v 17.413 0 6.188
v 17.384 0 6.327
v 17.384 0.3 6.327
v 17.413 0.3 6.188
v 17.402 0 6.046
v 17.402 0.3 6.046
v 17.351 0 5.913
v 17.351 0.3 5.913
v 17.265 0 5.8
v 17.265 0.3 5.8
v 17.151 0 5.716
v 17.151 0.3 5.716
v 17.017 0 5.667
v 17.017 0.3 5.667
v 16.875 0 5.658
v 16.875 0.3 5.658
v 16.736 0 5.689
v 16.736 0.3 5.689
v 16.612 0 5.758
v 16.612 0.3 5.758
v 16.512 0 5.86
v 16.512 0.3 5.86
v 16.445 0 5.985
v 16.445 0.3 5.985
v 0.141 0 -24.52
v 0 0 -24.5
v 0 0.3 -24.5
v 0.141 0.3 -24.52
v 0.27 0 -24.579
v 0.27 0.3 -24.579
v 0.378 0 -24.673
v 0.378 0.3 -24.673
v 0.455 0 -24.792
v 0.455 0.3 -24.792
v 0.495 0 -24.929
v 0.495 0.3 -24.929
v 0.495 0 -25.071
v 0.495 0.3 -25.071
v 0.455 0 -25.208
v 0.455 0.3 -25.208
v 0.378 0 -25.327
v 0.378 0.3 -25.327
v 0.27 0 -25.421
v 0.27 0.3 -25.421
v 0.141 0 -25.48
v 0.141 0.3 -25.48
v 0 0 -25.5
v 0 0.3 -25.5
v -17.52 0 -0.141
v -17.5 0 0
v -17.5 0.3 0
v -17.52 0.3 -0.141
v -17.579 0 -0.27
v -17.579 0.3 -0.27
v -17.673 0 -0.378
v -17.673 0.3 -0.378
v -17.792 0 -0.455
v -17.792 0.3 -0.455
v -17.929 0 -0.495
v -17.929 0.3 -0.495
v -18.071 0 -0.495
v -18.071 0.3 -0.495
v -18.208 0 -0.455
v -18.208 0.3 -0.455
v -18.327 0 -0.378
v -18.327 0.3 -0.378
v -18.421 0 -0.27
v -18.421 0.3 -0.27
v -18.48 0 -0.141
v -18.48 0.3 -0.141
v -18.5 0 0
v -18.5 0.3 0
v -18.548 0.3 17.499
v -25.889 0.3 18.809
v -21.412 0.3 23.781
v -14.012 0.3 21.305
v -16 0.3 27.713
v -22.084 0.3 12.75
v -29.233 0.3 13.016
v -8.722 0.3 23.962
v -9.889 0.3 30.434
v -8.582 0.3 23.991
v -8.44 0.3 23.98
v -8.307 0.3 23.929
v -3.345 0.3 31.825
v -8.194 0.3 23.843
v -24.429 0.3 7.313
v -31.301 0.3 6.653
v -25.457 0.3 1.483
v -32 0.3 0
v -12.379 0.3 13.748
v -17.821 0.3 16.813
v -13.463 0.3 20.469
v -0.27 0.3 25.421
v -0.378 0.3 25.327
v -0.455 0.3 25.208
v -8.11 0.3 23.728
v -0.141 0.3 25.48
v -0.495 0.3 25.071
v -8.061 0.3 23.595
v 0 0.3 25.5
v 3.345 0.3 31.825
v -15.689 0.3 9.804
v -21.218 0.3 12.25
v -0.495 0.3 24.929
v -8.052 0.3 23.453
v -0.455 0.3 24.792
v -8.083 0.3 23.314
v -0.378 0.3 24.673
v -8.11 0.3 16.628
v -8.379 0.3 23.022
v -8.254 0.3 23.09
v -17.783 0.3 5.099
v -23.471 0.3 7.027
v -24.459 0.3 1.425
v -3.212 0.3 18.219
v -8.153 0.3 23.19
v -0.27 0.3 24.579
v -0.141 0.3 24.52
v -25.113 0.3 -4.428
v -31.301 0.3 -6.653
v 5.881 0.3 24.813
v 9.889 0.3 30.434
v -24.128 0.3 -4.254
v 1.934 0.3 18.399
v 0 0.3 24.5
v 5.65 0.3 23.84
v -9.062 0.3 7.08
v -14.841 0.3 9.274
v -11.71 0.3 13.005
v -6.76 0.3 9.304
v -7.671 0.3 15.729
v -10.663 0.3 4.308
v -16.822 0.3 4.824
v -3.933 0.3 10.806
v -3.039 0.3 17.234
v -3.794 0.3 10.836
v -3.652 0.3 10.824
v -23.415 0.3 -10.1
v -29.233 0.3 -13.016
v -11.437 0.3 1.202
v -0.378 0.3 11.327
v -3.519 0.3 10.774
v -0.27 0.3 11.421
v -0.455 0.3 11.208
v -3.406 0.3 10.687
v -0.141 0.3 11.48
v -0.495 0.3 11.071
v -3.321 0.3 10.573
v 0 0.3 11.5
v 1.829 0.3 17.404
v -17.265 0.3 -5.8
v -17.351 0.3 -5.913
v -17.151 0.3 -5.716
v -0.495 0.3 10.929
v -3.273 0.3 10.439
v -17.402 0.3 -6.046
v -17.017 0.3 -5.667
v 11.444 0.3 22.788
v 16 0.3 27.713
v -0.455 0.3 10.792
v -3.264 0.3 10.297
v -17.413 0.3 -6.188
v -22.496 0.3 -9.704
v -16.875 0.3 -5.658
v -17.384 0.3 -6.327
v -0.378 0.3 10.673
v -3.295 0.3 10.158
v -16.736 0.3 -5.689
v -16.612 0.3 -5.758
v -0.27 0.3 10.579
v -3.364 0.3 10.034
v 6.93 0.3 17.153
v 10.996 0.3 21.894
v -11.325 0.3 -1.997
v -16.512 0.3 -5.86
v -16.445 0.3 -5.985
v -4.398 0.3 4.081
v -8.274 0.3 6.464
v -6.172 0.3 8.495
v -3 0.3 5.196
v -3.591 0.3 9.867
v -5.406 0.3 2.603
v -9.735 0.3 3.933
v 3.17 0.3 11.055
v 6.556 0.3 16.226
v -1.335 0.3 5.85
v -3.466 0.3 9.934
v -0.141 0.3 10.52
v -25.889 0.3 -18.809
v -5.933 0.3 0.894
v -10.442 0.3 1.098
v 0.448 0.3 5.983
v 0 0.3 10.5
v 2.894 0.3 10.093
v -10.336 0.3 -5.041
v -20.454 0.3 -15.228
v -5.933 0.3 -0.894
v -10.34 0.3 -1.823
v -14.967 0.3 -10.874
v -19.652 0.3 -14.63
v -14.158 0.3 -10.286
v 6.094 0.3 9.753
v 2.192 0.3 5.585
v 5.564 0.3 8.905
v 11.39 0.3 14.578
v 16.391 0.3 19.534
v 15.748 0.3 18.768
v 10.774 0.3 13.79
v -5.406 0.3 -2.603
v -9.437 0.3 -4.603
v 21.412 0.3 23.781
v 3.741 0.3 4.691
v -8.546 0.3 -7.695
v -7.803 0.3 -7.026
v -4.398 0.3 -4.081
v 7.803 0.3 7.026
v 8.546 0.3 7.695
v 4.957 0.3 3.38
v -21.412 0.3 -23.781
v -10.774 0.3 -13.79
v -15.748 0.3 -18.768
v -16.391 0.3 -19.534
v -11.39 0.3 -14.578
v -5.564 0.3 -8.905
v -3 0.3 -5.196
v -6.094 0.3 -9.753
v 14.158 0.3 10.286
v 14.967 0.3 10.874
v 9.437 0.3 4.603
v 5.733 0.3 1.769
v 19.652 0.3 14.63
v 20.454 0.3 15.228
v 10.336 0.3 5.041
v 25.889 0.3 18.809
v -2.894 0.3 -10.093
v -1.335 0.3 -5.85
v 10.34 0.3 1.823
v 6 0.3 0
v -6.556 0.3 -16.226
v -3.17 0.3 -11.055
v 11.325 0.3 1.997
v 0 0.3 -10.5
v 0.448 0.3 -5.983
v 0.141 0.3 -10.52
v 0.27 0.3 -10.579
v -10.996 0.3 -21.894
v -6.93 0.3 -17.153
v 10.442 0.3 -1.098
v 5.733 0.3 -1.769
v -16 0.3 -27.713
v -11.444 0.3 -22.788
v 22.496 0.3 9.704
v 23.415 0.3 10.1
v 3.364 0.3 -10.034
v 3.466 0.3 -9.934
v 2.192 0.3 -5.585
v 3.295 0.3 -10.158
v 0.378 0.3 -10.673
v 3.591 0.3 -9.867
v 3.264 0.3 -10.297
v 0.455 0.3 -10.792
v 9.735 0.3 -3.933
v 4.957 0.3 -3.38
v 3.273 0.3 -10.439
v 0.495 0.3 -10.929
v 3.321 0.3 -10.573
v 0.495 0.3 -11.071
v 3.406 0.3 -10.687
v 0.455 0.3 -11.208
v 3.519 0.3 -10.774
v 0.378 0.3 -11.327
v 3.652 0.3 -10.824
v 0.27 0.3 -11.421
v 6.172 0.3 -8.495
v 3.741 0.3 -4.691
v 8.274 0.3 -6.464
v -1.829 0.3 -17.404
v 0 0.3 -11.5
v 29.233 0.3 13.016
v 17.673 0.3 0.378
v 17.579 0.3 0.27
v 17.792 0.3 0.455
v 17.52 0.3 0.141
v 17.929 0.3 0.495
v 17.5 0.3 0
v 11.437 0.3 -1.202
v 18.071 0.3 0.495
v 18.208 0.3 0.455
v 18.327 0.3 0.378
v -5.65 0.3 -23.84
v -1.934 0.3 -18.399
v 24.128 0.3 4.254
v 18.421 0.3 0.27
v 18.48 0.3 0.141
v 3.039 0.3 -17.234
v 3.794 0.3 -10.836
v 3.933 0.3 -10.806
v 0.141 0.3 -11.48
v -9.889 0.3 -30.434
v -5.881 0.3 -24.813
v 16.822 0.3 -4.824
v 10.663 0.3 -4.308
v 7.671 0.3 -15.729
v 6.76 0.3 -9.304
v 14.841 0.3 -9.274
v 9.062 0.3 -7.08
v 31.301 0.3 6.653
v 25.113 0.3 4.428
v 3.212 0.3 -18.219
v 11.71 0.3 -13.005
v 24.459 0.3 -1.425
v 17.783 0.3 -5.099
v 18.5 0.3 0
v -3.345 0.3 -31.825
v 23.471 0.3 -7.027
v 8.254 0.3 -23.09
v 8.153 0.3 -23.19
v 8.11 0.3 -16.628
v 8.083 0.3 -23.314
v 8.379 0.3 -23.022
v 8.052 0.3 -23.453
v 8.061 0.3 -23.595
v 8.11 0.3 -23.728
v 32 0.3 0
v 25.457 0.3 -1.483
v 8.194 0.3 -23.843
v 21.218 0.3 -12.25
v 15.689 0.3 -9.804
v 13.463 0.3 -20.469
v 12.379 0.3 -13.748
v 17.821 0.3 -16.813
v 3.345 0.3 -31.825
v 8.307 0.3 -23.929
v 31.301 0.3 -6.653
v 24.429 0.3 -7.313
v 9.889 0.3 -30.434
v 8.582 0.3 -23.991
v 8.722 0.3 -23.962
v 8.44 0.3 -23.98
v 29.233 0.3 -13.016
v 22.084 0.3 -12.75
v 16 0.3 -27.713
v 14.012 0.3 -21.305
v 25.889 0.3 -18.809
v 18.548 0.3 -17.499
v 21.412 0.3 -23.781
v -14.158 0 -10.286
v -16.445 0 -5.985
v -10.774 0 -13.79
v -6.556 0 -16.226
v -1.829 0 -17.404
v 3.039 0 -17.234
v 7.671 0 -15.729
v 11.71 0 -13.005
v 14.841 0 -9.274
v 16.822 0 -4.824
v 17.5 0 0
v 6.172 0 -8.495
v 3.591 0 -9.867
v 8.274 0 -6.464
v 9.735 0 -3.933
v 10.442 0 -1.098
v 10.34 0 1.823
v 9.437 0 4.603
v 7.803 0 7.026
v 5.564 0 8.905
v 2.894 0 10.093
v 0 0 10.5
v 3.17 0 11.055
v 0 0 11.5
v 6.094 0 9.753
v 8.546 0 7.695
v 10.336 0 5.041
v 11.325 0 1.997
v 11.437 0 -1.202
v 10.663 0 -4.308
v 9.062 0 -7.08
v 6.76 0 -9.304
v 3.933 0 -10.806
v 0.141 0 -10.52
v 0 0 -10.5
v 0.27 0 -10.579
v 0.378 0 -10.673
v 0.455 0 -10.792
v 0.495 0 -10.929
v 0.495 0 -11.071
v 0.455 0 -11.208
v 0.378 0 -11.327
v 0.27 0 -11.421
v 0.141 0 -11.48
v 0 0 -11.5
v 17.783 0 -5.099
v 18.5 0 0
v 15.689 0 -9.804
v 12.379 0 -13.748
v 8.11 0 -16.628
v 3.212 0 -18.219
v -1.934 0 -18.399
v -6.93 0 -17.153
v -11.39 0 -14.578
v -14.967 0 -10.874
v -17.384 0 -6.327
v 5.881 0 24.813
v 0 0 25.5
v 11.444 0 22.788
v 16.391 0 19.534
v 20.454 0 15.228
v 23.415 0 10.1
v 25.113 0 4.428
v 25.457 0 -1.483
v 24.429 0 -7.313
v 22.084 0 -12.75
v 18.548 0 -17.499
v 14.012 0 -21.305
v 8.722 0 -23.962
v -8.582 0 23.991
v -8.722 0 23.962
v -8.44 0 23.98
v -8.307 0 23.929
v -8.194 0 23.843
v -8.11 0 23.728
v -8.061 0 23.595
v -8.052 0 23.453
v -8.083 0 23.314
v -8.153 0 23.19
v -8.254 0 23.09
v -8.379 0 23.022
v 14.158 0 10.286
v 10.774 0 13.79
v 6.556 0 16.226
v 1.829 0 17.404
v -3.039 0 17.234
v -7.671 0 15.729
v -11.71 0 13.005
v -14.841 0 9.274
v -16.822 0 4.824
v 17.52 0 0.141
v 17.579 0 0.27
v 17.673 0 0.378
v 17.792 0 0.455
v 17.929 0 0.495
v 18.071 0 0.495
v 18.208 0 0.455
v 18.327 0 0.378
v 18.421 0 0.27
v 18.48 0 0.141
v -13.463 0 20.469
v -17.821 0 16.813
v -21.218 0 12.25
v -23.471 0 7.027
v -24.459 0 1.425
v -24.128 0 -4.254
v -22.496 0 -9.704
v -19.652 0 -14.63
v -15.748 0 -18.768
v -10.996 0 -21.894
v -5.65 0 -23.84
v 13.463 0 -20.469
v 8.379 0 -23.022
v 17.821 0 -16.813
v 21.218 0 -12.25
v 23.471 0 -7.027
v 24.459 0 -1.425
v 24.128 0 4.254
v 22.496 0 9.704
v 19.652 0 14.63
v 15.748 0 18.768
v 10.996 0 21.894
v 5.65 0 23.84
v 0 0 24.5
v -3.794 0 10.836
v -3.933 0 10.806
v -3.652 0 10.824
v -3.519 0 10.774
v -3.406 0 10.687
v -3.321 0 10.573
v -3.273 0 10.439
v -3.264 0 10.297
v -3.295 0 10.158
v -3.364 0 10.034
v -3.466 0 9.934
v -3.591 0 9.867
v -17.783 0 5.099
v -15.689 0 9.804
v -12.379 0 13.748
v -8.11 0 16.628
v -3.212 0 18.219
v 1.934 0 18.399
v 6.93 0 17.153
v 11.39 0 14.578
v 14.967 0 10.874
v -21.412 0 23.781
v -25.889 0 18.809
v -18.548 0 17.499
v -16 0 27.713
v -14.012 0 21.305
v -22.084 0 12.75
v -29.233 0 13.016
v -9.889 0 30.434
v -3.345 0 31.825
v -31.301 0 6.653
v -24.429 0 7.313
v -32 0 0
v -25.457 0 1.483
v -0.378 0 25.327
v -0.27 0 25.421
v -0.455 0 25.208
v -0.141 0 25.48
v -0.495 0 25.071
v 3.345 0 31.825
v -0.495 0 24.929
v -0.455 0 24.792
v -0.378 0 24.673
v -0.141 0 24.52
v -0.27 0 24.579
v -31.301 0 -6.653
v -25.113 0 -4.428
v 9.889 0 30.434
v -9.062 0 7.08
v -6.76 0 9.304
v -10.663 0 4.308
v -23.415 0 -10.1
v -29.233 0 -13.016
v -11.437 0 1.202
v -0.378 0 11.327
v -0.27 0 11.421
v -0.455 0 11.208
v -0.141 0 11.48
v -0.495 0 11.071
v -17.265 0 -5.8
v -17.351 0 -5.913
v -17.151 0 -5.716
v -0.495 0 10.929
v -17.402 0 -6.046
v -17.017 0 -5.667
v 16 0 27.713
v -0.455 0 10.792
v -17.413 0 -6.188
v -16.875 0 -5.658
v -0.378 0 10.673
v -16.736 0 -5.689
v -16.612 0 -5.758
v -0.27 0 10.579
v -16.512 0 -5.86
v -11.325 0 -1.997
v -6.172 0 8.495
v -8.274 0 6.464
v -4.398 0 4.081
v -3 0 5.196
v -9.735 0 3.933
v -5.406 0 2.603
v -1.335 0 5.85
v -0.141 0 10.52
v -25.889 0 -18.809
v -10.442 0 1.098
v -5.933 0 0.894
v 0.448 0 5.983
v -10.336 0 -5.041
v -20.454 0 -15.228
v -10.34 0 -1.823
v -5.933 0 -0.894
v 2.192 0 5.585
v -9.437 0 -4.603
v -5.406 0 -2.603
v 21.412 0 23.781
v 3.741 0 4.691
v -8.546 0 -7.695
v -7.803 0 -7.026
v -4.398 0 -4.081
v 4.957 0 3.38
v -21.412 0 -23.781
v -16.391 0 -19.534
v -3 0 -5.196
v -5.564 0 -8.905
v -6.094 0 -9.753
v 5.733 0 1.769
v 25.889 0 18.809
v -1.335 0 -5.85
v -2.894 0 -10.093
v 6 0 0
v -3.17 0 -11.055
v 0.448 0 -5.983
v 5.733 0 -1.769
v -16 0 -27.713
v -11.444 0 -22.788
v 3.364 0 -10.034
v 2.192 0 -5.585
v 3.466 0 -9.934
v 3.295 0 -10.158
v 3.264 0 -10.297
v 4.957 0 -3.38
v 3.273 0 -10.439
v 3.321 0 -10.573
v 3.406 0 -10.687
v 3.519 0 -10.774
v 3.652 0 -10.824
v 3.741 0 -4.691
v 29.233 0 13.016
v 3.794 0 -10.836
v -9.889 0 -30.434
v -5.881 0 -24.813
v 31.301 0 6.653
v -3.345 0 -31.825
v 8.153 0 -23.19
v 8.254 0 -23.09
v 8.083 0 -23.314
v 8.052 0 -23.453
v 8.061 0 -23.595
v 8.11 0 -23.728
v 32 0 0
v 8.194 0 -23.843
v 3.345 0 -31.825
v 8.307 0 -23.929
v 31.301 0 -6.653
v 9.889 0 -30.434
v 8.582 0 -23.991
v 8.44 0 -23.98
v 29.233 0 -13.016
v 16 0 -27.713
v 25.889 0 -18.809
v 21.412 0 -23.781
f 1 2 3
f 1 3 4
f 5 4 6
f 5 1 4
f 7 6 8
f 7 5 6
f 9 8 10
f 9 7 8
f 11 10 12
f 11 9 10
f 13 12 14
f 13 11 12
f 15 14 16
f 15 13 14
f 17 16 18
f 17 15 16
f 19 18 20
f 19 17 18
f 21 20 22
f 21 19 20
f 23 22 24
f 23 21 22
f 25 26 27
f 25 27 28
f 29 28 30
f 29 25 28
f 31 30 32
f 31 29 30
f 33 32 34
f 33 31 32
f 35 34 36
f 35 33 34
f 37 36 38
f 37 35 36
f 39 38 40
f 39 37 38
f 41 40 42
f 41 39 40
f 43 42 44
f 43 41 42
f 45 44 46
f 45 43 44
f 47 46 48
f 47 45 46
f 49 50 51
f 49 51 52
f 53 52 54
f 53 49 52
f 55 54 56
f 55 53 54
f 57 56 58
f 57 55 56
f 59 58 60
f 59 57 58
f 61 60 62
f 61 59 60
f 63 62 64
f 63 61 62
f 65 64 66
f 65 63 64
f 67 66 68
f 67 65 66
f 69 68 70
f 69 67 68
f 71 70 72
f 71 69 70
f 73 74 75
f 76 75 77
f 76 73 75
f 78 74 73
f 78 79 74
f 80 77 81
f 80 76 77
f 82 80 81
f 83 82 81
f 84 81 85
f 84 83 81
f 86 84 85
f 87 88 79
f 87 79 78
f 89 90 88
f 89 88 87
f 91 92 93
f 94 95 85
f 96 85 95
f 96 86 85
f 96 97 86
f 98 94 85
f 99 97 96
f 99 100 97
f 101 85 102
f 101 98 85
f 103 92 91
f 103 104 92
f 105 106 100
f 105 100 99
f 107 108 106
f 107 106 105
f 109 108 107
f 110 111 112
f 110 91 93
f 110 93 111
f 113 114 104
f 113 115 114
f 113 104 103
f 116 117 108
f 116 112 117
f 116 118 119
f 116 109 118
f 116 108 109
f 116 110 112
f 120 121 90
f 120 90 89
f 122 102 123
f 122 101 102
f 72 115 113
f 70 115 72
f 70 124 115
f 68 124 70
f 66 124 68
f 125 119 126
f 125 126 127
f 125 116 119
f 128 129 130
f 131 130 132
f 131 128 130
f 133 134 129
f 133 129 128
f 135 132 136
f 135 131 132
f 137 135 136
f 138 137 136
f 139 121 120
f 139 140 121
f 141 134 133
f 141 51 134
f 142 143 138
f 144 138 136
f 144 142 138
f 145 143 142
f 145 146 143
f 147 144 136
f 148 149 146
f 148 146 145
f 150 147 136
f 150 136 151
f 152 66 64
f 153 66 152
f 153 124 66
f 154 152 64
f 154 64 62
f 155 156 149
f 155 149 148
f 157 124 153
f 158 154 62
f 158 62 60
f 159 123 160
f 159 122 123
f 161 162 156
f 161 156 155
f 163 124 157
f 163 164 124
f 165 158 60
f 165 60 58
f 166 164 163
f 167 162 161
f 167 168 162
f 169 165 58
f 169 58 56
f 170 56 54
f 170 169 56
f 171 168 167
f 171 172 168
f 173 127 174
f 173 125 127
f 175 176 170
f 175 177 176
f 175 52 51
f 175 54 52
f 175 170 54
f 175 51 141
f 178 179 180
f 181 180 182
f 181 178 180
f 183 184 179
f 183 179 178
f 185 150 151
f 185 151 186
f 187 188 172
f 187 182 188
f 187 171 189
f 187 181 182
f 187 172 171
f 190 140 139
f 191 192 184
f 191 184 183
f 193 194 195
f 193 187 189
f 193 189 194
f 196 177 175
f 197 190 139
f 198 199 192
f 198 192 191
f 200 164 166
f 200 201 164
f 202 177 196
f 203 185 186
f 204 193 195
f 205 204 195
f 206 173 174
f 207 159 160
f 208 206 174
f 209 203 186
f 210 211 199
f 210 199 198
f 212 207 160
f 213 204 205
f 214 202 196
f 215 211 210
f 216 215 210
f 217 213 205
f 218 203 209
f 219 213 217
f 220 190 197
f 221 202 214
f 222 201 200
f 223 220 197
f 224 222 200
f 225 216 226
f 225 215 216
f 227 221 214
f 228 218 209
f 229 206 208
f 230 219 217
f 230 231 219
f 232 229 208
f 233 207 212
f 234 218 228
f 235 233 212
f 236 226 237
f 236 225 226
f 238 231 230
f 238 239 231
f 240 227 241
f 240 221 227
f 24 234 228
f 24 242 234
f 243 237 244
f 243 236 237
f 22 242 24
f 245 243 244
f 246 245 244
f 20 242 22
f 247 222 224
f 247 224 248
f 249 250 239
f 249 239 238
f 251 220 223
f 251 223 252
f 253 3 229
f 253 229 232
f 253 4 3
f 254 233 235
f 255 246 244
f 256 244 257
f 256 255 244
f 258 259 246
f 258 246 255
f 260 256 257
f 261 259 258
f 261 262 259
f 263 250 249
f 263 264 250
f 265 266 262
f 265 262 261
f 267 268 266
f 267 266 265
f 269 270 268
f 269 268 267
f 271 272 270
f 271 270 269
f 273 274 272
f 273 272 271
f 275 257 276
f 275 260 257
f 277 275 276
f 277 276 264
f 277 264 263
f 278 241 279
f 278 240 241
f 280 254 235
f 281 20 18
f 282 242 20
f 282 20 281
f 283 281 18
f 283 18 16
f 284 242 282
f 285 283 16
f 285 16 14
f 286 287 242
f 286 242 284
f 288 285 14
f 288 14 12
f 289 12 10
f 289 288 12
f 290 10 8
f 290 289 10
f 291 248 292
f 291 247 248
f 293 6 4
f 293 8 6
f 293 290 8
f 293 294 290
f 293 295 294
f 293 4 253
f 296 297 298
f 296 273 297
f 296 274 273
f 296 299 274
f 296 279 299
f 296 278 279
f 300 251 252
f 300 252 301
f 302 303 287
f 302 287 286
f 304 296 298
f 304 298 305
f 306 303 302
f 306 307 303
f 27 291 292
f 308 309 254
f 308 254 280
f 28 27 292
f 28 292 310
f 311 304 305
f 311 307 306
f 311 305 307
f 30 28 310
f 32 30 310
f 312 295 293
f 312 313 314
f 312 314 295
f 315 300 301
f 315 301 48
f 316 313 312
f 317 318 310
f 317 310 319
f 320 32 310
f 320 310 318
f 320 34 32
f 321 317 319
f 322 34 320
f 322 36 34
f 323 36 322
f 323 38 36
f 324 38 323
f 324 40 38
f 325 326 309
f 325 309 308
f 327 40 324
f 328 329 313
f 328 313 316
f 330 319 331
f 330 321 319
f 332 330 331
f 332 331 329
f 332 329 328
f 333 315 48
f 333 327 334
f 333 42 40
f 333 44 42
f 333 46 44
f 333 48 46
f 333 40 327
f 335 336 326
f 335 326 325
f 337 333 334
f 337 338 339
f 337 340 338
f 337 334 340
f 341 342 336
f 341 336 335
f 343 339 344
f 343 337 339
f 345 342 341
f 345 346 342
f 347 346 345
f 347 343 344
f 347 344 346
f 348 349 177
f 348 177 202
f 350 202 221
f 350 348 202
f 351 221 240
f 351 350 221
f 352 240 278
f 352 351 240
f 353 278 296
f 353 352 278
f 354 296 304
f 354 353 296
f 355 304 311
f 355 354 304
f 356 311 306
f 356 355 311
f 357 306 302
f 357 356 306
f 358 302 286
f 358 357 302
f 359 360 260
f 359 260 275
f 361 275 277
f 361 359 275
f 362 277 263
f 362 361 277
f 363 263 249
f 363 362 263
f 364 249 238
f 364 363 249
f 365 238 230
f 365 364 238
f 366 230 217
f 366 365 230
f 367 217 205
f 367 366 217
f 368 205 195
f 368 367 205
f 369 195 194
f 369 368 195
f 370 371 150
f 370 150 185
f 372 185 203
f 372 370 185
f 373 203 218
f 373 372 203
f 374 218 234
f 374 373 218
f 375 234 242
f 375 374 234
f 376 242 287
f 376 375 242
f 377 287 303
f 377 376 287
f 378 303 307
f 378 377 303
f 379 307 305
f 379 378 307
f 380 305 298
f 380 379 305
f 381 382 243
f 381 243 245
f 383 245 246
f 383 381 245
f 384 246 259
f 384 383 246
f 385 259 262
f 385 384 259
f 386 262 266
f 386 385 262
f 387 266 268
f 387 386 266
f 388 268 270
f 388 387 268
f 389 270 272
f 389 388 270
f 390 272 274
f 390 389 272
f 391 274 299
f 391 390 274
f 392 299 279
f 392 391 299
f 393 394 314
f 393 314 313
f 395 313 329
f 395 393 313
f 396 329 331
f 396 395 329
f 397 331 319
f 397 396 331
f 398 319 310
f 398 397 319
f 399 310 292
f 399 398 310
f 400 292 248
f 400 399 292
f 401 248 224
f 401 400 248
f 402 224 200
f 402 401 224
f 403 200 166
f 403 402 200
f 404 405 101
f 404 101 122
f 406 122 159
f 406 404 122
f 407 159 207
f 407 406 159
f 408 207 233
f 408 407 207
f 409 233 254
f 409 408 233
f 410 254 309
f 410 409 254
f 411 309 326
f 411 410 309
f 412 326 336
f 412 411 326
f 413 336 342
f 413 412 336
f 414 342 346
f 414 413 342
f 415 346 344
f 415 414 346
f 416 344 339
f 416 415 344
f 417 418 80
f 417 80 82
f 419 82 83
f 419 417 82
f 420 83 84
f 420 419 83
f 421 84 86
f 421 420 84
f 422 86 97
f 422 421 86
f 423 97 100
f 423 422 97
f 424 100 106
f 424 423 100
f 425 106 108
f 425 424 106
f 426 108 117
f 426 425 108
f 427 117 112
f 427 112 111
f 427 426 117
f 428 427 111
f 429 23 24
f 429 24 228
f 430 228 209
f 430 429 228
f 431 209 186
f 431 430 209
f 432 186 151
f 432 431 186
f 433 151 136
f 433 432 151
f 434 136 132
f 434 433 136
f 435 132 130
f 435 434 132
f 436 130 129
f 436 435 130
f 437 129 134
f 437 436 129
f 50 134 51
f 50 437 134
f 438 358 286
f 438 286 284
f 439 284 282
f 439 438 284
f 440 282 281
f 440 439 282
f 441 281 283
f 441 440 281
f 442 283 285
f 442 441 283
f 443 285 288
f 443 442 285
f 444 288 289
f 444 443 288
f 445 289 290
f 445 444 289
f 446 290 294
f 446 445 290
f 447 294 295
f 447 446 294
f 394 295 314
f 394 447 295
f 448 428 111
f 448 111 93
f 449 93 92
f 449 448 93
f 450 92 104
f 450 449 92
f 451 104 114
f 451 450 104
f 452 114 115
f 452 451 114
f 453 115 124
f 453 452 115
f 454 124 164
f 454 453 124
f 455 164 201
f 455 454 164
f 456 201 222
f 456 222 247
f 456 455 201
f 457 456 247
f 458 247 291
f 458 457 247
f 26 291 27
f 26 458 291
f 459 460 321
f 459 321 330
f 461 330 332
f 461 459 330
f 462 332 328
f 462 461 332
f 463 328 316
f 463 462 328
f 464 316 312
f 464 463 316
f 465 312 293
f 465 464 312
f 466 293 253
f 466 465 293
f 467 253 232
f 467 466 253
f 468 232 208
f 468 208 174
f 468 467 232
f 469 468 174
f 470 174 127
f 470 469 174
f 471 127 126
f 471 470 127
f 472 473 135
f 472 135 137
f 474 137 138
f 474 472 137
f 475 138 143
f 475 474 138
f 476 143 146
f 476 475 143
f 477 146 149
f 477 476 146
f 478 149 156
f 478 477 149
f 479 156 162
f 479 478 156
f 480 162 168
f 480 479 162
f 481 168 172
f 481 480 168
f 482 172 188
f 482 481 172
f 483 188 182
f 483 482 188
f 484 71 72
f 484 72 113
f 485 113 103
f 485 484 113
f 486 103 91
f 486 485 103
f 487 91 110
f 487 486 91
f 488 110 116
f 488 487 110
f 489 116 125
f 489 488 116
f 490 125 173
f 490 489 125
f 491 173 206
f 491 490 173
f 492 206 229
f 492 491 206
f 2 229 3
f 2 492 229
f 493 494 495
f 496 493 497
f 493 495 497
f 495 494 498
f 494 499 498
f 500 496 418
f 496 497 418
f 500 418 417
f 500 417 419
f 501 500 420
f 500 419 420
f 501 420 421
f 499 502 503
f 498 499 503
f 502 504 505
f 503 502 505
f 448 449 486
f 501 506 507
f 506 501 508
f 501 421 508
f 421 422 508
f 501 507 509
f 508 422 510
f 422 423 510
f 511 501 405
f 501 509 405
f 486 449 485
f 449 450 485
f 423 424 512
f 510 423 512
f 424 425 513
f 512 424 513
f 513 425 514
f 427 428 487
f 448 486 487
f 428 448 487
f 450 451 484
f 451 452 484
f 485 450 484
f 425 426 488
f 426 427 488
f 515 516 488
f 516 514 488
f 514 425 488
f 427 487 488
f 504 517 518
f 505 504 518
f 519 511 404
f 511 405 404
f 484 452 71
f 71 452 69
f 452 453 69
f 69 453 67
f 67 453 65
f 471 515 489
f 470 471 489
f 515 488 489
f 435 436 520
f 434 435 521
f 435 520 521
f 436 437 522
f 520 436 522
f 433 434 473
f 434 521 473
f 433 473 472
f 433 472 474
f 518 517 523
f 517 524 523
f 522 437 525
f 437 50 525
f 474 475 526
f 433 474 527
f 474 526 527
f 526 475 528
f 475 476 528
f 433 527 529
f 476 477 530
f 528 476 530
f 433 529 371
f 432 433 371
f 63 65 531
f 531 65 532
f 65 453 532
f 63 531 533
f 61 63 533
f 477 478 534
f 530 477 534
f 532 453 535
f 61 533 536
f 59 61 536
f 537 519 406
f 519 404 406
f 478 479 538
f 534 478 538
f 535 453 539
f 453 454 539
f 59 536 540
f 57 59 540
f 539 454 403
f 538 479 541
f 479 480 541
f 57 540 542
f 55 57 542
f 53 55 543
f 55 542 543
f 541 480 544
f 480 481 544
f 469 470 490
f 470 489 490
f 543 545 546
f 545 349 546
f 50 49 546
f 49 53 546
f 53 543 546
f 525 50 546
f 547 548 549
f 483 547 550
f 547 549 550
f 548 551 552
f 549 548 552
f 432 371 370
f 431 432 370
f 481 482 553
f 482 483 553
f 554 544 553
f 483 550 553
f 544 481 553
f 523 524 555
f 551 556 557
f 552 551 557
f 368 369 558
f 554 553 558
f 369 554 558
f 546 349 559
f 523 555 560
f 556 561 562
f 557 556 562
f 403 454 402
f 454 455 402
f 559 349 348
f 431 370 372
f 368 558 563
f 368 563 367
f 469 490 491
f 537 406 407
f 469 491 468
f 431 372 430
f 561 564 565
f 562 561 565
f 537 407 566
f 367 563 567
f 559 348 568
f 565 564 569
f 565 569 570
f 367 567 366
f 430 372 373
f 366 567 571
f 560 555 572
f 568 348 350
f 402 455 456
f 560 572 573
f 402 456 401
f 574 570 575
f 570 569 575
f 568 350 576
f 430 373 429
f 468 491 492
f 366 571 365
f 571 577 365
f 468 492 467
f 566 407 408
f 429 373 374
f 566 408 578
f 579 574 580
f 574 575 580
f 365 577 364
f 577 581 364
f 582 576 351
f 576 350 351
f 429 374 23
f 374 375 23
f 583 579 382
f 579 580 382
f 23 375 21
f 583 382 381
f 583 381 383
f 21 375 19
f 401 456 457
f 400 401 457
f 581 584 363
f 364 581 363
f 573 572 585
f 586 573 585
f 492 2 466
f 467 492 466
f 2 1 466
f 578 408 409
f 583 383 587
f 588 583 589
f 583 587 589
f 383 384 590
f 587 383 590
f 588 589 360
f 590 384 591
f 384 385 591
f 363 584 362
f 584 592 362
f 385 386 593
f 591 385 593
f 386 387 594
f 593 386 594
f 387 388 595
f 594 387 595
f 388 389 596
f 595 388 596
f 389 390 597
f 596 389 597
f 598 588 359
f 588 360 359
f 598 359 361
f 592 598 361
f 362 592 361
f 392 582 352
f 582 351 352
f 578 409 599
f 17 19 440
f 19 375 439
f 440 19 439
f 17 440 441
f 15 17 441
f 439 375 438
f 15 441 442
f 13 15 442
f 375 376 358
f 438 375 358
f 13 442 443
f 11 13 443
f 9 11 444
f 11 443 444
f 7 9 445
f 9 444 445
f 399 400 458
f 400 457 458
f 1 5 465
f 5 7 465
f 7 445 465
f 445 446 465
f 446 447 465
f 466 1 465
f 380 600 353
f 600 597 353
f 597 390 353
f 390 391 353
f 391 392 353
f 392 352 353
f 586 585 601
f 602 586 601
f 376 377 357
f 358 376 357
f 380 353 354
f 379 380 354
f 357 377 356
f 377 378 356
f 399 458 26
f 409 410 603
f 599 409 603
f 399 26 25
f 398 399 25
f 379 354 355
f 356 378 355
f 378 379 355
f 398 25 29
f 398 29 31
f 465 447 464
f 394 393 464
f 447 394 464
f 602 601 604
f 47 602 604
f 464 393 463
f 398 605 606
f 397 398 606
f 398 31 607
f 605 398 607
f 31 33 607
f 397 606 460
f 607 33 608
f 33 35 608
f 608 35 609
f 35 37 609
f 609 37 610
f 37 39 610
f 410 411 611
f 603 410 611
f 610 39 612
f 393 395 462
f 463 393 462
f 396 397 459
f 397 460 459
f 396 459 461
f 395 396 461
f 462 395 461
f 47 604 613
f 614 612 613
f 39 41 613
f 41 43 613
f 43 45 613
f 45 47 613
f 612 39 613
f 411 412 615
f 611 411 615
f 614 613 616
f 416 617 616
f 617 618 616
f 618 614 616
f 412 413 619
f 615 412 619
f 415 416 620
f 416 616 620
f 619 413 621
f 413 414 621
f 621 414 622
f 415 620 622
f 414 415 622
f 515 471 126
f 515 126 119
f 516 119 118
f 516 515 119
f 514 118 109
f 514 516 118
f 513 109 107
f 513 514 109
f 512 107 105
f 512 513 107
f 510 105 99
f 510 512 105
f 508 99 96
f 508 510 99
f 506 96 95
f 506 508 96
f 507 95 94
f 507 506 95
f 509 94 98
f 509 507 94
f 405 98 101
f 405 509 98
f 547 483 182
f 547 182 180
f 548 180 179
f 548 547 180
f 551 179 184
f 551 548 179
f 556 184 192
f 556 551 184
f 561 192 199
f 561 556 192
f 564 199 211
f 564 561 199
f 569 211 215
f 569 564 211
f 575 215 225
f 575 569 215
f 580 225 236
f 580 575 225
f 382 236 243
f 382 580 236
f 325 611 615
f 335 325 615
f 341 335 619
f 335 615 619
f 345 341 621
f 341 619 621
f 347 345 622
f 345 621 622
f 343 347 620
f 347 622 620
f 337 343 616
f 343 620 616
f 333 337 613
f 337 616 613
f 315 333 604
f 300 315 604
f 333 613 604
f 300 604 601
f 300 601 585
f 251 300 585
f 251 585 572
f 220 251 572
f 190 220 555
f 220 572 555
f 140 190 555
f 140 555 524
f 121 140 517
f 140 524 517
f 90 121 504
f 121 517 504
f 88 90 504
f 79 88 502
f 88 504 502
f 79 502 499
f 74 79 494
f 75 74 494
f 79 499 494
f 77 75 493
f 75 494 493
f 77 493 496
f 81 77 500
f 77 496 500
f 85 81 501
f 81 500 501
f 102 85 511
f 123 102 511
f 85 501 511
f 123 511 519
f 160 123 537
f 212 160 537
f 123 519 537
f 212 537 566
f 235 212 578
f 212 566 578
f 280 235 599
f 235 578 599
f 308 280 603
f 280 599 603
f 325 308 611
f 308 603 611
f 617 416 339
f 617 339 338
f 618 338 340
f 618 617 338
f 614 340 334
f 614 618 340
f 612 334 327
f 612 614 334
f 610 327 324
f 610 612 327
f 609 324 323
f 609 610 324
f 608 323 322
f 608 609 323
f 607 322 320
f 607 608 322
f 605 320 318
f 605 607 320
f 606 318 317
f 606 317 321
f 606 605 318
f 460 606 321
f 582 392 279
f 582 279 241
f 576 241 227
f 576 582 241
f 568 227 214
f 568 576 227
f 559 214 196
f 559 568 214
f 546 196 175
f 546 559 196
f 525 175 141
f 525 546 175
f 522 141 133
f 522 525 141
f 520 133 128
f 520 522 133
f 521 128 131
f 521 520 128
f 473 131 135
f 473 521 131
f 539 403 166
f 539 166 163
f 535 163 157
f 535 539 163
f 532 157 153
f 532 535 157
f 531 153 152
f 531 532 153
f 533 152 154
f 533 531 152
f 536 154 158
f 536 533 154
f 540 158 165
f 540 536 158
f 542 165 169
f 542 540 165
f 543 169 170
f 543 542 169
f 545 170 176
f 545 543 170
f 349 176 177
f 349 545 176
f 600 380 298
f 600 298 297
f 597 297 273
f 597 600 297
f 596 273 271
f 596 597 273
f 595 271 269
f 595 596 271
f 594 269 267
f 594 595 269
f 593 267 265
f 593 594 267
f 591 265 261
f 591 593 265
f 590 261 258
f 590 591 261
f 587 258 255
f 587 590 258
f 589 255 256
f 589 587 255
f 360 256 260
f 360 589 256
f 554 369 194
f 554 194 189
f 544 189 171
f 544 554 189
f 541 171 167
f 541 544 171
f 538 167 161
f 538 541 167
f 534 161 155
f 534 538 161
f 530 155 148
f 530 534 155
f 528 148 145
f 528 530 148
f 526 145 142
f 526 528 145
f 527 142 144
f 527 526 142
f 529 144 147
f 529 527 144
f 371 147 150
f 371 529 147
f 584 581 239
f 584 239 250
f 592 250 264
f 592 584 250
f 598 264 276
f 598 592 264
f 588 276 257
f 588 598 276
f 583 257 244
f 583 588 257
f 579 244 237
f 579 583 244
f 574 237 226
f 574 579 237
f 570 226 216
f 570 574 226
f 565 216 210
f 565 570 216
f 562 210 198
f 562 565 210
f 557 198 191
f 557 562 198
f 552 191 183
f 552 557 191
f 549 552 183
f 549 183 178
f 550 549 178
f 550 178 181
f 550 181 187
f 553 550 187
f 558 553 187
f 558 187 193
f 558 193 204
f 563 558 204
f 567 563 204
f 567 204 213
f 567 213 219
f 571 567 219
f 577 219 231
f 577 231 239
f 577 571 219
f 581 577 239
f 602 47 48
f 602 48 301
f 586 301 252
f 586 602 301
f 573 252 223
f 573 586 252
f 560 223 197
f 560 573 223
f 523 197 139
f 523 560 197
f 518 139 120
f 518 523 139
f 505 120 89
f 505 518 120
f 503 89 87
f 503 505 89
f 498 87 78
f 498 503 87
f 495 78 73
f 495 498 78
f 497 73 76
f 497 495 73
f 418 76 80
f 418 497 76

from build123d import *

# Parameters (mm, degrees)
SKETCH1_R           = 32
SKETCH1_R_2         = 6
BOSS_EXTRUDE1_DEPTH = 0.3


with BuildPart() as part:
    # Sketch1 → Boss-Extrude1 (new body)
    with BuildSketch(Plane(origin=(0, 0, 0), x_dir=(1, 0, 0), z_dir=(0, 1, 0))):
        Circle(SKETCH1_R)
        Circle(SKETCH1_R_2, mode=Mode.SUBTRACT)
        with BuildLine():
            ThreePointArc((0, 25.5), (-25.112597702, 4.428028531), (-8.721513655, -23.96216183))
            ThreePointArc((-8.721513655, -23.96216183), (-8.080657273, -23.663325591), (-8.379493511, -23.022469209))
            ThreePointArc((-8.379493511, -23.022469209), (-24.127789949, 4.254380353), (0, 24.5))
            ThreePointArc((0, 24.5), (0.5, 25), (0, 25.5))
        make_face(mode=Mode.SUBTRACT)
        with BuildLine():
            ThreePointArc((18.5, 0), (3.212491287, 18.218943431), (-17.384313485, 6.327372652))
            ThreePointArc((-17.384313485, 6.327372652), (-17.085477246, 5.686516269), (-16.444620864, 5.985352508))
            ThreePointArc((-16.444620864, 5.985352508), (3.038843109, 17.234135678), (17.5, 0))
            ThreePointArc((17.5, 0), (18, -0.5), (18.5, 0))
        make_face(mode=Mode.SUBTRACT)
        with BuildLine():
            ThreePointArc((0, -25.5), (25.112597702, -4.428028531), (8.721513655, 23.96216183))
            ThreePointArc((8.721513655, 23.96216183), (8.080657273, 23.663325591), (8.379493511, 23.022469209))
            ThreePointArc((8.379493511, 23.022469209), (24.127789949, -4.254380353), (0, -24.5))
            ThreePointArc((0, -24.5), (-0.5, -25), (0, -25.5))
        make_face(mode=Mode.SUBTRACT)
        with BuildLine():
            ThreePointArc((0, 11.5), (-11.32528916, 1.996954043), (-3.933231648, -10.806465139))
            ThreePointArc((-3.933231648, -10.806465139), (-3.292375266, -10.5076289), (-3.591211505, -9.866772518))
            ThreePointArc((-3.591211505, -9.866772518), (-10.340481407, 1.823305866), (0, 10.5))
            ThreePointArc((0, 10.5), (0.5, 11), (0, 11.5))
        make_face(mode=Mode.SUBTRACT)
        with BuildLine():
            ThreePointArc((0, -11.5), (11.32528916, -1.996954043), (3.933231648, 10.806465139))
            ThreePointArc((3.933231648, 10.806465139), (3.292375266, 10.5076289), (3.591211505, 9.866772518))
            ThreePointArc((3.591211505, 9.866772518), (10.340481407, -1.823305866), (0, -10.5))
            ThreePointArc((0, -10.5), (-0.5, -11), (0, -11.5))
        make_face(mode=Mode.SUBTRACT)
        with BuildLine():
            ThreePointArc((-18.5, 0), (-3.212491287, -18.218943431), (17.384313485, -6.327372652))
            ThreePointArc((17.384313485, -6.327372652), (17.085477246, -5.686516269), (16.444620864, -5.985352508))
            ThreePointArc((16.444620864, -5.985352508), (-3.038843109, -17.234135678), (-17.5, 0))
            ThreePointArc((-17.5, 0), (-18, 0.5), (-18.5, 0))
        make_face(mode=Mode.SUBTRACT)
    extrude(amount=BOSS_EXTRUDE1_DEPTH)


solid = part.part
